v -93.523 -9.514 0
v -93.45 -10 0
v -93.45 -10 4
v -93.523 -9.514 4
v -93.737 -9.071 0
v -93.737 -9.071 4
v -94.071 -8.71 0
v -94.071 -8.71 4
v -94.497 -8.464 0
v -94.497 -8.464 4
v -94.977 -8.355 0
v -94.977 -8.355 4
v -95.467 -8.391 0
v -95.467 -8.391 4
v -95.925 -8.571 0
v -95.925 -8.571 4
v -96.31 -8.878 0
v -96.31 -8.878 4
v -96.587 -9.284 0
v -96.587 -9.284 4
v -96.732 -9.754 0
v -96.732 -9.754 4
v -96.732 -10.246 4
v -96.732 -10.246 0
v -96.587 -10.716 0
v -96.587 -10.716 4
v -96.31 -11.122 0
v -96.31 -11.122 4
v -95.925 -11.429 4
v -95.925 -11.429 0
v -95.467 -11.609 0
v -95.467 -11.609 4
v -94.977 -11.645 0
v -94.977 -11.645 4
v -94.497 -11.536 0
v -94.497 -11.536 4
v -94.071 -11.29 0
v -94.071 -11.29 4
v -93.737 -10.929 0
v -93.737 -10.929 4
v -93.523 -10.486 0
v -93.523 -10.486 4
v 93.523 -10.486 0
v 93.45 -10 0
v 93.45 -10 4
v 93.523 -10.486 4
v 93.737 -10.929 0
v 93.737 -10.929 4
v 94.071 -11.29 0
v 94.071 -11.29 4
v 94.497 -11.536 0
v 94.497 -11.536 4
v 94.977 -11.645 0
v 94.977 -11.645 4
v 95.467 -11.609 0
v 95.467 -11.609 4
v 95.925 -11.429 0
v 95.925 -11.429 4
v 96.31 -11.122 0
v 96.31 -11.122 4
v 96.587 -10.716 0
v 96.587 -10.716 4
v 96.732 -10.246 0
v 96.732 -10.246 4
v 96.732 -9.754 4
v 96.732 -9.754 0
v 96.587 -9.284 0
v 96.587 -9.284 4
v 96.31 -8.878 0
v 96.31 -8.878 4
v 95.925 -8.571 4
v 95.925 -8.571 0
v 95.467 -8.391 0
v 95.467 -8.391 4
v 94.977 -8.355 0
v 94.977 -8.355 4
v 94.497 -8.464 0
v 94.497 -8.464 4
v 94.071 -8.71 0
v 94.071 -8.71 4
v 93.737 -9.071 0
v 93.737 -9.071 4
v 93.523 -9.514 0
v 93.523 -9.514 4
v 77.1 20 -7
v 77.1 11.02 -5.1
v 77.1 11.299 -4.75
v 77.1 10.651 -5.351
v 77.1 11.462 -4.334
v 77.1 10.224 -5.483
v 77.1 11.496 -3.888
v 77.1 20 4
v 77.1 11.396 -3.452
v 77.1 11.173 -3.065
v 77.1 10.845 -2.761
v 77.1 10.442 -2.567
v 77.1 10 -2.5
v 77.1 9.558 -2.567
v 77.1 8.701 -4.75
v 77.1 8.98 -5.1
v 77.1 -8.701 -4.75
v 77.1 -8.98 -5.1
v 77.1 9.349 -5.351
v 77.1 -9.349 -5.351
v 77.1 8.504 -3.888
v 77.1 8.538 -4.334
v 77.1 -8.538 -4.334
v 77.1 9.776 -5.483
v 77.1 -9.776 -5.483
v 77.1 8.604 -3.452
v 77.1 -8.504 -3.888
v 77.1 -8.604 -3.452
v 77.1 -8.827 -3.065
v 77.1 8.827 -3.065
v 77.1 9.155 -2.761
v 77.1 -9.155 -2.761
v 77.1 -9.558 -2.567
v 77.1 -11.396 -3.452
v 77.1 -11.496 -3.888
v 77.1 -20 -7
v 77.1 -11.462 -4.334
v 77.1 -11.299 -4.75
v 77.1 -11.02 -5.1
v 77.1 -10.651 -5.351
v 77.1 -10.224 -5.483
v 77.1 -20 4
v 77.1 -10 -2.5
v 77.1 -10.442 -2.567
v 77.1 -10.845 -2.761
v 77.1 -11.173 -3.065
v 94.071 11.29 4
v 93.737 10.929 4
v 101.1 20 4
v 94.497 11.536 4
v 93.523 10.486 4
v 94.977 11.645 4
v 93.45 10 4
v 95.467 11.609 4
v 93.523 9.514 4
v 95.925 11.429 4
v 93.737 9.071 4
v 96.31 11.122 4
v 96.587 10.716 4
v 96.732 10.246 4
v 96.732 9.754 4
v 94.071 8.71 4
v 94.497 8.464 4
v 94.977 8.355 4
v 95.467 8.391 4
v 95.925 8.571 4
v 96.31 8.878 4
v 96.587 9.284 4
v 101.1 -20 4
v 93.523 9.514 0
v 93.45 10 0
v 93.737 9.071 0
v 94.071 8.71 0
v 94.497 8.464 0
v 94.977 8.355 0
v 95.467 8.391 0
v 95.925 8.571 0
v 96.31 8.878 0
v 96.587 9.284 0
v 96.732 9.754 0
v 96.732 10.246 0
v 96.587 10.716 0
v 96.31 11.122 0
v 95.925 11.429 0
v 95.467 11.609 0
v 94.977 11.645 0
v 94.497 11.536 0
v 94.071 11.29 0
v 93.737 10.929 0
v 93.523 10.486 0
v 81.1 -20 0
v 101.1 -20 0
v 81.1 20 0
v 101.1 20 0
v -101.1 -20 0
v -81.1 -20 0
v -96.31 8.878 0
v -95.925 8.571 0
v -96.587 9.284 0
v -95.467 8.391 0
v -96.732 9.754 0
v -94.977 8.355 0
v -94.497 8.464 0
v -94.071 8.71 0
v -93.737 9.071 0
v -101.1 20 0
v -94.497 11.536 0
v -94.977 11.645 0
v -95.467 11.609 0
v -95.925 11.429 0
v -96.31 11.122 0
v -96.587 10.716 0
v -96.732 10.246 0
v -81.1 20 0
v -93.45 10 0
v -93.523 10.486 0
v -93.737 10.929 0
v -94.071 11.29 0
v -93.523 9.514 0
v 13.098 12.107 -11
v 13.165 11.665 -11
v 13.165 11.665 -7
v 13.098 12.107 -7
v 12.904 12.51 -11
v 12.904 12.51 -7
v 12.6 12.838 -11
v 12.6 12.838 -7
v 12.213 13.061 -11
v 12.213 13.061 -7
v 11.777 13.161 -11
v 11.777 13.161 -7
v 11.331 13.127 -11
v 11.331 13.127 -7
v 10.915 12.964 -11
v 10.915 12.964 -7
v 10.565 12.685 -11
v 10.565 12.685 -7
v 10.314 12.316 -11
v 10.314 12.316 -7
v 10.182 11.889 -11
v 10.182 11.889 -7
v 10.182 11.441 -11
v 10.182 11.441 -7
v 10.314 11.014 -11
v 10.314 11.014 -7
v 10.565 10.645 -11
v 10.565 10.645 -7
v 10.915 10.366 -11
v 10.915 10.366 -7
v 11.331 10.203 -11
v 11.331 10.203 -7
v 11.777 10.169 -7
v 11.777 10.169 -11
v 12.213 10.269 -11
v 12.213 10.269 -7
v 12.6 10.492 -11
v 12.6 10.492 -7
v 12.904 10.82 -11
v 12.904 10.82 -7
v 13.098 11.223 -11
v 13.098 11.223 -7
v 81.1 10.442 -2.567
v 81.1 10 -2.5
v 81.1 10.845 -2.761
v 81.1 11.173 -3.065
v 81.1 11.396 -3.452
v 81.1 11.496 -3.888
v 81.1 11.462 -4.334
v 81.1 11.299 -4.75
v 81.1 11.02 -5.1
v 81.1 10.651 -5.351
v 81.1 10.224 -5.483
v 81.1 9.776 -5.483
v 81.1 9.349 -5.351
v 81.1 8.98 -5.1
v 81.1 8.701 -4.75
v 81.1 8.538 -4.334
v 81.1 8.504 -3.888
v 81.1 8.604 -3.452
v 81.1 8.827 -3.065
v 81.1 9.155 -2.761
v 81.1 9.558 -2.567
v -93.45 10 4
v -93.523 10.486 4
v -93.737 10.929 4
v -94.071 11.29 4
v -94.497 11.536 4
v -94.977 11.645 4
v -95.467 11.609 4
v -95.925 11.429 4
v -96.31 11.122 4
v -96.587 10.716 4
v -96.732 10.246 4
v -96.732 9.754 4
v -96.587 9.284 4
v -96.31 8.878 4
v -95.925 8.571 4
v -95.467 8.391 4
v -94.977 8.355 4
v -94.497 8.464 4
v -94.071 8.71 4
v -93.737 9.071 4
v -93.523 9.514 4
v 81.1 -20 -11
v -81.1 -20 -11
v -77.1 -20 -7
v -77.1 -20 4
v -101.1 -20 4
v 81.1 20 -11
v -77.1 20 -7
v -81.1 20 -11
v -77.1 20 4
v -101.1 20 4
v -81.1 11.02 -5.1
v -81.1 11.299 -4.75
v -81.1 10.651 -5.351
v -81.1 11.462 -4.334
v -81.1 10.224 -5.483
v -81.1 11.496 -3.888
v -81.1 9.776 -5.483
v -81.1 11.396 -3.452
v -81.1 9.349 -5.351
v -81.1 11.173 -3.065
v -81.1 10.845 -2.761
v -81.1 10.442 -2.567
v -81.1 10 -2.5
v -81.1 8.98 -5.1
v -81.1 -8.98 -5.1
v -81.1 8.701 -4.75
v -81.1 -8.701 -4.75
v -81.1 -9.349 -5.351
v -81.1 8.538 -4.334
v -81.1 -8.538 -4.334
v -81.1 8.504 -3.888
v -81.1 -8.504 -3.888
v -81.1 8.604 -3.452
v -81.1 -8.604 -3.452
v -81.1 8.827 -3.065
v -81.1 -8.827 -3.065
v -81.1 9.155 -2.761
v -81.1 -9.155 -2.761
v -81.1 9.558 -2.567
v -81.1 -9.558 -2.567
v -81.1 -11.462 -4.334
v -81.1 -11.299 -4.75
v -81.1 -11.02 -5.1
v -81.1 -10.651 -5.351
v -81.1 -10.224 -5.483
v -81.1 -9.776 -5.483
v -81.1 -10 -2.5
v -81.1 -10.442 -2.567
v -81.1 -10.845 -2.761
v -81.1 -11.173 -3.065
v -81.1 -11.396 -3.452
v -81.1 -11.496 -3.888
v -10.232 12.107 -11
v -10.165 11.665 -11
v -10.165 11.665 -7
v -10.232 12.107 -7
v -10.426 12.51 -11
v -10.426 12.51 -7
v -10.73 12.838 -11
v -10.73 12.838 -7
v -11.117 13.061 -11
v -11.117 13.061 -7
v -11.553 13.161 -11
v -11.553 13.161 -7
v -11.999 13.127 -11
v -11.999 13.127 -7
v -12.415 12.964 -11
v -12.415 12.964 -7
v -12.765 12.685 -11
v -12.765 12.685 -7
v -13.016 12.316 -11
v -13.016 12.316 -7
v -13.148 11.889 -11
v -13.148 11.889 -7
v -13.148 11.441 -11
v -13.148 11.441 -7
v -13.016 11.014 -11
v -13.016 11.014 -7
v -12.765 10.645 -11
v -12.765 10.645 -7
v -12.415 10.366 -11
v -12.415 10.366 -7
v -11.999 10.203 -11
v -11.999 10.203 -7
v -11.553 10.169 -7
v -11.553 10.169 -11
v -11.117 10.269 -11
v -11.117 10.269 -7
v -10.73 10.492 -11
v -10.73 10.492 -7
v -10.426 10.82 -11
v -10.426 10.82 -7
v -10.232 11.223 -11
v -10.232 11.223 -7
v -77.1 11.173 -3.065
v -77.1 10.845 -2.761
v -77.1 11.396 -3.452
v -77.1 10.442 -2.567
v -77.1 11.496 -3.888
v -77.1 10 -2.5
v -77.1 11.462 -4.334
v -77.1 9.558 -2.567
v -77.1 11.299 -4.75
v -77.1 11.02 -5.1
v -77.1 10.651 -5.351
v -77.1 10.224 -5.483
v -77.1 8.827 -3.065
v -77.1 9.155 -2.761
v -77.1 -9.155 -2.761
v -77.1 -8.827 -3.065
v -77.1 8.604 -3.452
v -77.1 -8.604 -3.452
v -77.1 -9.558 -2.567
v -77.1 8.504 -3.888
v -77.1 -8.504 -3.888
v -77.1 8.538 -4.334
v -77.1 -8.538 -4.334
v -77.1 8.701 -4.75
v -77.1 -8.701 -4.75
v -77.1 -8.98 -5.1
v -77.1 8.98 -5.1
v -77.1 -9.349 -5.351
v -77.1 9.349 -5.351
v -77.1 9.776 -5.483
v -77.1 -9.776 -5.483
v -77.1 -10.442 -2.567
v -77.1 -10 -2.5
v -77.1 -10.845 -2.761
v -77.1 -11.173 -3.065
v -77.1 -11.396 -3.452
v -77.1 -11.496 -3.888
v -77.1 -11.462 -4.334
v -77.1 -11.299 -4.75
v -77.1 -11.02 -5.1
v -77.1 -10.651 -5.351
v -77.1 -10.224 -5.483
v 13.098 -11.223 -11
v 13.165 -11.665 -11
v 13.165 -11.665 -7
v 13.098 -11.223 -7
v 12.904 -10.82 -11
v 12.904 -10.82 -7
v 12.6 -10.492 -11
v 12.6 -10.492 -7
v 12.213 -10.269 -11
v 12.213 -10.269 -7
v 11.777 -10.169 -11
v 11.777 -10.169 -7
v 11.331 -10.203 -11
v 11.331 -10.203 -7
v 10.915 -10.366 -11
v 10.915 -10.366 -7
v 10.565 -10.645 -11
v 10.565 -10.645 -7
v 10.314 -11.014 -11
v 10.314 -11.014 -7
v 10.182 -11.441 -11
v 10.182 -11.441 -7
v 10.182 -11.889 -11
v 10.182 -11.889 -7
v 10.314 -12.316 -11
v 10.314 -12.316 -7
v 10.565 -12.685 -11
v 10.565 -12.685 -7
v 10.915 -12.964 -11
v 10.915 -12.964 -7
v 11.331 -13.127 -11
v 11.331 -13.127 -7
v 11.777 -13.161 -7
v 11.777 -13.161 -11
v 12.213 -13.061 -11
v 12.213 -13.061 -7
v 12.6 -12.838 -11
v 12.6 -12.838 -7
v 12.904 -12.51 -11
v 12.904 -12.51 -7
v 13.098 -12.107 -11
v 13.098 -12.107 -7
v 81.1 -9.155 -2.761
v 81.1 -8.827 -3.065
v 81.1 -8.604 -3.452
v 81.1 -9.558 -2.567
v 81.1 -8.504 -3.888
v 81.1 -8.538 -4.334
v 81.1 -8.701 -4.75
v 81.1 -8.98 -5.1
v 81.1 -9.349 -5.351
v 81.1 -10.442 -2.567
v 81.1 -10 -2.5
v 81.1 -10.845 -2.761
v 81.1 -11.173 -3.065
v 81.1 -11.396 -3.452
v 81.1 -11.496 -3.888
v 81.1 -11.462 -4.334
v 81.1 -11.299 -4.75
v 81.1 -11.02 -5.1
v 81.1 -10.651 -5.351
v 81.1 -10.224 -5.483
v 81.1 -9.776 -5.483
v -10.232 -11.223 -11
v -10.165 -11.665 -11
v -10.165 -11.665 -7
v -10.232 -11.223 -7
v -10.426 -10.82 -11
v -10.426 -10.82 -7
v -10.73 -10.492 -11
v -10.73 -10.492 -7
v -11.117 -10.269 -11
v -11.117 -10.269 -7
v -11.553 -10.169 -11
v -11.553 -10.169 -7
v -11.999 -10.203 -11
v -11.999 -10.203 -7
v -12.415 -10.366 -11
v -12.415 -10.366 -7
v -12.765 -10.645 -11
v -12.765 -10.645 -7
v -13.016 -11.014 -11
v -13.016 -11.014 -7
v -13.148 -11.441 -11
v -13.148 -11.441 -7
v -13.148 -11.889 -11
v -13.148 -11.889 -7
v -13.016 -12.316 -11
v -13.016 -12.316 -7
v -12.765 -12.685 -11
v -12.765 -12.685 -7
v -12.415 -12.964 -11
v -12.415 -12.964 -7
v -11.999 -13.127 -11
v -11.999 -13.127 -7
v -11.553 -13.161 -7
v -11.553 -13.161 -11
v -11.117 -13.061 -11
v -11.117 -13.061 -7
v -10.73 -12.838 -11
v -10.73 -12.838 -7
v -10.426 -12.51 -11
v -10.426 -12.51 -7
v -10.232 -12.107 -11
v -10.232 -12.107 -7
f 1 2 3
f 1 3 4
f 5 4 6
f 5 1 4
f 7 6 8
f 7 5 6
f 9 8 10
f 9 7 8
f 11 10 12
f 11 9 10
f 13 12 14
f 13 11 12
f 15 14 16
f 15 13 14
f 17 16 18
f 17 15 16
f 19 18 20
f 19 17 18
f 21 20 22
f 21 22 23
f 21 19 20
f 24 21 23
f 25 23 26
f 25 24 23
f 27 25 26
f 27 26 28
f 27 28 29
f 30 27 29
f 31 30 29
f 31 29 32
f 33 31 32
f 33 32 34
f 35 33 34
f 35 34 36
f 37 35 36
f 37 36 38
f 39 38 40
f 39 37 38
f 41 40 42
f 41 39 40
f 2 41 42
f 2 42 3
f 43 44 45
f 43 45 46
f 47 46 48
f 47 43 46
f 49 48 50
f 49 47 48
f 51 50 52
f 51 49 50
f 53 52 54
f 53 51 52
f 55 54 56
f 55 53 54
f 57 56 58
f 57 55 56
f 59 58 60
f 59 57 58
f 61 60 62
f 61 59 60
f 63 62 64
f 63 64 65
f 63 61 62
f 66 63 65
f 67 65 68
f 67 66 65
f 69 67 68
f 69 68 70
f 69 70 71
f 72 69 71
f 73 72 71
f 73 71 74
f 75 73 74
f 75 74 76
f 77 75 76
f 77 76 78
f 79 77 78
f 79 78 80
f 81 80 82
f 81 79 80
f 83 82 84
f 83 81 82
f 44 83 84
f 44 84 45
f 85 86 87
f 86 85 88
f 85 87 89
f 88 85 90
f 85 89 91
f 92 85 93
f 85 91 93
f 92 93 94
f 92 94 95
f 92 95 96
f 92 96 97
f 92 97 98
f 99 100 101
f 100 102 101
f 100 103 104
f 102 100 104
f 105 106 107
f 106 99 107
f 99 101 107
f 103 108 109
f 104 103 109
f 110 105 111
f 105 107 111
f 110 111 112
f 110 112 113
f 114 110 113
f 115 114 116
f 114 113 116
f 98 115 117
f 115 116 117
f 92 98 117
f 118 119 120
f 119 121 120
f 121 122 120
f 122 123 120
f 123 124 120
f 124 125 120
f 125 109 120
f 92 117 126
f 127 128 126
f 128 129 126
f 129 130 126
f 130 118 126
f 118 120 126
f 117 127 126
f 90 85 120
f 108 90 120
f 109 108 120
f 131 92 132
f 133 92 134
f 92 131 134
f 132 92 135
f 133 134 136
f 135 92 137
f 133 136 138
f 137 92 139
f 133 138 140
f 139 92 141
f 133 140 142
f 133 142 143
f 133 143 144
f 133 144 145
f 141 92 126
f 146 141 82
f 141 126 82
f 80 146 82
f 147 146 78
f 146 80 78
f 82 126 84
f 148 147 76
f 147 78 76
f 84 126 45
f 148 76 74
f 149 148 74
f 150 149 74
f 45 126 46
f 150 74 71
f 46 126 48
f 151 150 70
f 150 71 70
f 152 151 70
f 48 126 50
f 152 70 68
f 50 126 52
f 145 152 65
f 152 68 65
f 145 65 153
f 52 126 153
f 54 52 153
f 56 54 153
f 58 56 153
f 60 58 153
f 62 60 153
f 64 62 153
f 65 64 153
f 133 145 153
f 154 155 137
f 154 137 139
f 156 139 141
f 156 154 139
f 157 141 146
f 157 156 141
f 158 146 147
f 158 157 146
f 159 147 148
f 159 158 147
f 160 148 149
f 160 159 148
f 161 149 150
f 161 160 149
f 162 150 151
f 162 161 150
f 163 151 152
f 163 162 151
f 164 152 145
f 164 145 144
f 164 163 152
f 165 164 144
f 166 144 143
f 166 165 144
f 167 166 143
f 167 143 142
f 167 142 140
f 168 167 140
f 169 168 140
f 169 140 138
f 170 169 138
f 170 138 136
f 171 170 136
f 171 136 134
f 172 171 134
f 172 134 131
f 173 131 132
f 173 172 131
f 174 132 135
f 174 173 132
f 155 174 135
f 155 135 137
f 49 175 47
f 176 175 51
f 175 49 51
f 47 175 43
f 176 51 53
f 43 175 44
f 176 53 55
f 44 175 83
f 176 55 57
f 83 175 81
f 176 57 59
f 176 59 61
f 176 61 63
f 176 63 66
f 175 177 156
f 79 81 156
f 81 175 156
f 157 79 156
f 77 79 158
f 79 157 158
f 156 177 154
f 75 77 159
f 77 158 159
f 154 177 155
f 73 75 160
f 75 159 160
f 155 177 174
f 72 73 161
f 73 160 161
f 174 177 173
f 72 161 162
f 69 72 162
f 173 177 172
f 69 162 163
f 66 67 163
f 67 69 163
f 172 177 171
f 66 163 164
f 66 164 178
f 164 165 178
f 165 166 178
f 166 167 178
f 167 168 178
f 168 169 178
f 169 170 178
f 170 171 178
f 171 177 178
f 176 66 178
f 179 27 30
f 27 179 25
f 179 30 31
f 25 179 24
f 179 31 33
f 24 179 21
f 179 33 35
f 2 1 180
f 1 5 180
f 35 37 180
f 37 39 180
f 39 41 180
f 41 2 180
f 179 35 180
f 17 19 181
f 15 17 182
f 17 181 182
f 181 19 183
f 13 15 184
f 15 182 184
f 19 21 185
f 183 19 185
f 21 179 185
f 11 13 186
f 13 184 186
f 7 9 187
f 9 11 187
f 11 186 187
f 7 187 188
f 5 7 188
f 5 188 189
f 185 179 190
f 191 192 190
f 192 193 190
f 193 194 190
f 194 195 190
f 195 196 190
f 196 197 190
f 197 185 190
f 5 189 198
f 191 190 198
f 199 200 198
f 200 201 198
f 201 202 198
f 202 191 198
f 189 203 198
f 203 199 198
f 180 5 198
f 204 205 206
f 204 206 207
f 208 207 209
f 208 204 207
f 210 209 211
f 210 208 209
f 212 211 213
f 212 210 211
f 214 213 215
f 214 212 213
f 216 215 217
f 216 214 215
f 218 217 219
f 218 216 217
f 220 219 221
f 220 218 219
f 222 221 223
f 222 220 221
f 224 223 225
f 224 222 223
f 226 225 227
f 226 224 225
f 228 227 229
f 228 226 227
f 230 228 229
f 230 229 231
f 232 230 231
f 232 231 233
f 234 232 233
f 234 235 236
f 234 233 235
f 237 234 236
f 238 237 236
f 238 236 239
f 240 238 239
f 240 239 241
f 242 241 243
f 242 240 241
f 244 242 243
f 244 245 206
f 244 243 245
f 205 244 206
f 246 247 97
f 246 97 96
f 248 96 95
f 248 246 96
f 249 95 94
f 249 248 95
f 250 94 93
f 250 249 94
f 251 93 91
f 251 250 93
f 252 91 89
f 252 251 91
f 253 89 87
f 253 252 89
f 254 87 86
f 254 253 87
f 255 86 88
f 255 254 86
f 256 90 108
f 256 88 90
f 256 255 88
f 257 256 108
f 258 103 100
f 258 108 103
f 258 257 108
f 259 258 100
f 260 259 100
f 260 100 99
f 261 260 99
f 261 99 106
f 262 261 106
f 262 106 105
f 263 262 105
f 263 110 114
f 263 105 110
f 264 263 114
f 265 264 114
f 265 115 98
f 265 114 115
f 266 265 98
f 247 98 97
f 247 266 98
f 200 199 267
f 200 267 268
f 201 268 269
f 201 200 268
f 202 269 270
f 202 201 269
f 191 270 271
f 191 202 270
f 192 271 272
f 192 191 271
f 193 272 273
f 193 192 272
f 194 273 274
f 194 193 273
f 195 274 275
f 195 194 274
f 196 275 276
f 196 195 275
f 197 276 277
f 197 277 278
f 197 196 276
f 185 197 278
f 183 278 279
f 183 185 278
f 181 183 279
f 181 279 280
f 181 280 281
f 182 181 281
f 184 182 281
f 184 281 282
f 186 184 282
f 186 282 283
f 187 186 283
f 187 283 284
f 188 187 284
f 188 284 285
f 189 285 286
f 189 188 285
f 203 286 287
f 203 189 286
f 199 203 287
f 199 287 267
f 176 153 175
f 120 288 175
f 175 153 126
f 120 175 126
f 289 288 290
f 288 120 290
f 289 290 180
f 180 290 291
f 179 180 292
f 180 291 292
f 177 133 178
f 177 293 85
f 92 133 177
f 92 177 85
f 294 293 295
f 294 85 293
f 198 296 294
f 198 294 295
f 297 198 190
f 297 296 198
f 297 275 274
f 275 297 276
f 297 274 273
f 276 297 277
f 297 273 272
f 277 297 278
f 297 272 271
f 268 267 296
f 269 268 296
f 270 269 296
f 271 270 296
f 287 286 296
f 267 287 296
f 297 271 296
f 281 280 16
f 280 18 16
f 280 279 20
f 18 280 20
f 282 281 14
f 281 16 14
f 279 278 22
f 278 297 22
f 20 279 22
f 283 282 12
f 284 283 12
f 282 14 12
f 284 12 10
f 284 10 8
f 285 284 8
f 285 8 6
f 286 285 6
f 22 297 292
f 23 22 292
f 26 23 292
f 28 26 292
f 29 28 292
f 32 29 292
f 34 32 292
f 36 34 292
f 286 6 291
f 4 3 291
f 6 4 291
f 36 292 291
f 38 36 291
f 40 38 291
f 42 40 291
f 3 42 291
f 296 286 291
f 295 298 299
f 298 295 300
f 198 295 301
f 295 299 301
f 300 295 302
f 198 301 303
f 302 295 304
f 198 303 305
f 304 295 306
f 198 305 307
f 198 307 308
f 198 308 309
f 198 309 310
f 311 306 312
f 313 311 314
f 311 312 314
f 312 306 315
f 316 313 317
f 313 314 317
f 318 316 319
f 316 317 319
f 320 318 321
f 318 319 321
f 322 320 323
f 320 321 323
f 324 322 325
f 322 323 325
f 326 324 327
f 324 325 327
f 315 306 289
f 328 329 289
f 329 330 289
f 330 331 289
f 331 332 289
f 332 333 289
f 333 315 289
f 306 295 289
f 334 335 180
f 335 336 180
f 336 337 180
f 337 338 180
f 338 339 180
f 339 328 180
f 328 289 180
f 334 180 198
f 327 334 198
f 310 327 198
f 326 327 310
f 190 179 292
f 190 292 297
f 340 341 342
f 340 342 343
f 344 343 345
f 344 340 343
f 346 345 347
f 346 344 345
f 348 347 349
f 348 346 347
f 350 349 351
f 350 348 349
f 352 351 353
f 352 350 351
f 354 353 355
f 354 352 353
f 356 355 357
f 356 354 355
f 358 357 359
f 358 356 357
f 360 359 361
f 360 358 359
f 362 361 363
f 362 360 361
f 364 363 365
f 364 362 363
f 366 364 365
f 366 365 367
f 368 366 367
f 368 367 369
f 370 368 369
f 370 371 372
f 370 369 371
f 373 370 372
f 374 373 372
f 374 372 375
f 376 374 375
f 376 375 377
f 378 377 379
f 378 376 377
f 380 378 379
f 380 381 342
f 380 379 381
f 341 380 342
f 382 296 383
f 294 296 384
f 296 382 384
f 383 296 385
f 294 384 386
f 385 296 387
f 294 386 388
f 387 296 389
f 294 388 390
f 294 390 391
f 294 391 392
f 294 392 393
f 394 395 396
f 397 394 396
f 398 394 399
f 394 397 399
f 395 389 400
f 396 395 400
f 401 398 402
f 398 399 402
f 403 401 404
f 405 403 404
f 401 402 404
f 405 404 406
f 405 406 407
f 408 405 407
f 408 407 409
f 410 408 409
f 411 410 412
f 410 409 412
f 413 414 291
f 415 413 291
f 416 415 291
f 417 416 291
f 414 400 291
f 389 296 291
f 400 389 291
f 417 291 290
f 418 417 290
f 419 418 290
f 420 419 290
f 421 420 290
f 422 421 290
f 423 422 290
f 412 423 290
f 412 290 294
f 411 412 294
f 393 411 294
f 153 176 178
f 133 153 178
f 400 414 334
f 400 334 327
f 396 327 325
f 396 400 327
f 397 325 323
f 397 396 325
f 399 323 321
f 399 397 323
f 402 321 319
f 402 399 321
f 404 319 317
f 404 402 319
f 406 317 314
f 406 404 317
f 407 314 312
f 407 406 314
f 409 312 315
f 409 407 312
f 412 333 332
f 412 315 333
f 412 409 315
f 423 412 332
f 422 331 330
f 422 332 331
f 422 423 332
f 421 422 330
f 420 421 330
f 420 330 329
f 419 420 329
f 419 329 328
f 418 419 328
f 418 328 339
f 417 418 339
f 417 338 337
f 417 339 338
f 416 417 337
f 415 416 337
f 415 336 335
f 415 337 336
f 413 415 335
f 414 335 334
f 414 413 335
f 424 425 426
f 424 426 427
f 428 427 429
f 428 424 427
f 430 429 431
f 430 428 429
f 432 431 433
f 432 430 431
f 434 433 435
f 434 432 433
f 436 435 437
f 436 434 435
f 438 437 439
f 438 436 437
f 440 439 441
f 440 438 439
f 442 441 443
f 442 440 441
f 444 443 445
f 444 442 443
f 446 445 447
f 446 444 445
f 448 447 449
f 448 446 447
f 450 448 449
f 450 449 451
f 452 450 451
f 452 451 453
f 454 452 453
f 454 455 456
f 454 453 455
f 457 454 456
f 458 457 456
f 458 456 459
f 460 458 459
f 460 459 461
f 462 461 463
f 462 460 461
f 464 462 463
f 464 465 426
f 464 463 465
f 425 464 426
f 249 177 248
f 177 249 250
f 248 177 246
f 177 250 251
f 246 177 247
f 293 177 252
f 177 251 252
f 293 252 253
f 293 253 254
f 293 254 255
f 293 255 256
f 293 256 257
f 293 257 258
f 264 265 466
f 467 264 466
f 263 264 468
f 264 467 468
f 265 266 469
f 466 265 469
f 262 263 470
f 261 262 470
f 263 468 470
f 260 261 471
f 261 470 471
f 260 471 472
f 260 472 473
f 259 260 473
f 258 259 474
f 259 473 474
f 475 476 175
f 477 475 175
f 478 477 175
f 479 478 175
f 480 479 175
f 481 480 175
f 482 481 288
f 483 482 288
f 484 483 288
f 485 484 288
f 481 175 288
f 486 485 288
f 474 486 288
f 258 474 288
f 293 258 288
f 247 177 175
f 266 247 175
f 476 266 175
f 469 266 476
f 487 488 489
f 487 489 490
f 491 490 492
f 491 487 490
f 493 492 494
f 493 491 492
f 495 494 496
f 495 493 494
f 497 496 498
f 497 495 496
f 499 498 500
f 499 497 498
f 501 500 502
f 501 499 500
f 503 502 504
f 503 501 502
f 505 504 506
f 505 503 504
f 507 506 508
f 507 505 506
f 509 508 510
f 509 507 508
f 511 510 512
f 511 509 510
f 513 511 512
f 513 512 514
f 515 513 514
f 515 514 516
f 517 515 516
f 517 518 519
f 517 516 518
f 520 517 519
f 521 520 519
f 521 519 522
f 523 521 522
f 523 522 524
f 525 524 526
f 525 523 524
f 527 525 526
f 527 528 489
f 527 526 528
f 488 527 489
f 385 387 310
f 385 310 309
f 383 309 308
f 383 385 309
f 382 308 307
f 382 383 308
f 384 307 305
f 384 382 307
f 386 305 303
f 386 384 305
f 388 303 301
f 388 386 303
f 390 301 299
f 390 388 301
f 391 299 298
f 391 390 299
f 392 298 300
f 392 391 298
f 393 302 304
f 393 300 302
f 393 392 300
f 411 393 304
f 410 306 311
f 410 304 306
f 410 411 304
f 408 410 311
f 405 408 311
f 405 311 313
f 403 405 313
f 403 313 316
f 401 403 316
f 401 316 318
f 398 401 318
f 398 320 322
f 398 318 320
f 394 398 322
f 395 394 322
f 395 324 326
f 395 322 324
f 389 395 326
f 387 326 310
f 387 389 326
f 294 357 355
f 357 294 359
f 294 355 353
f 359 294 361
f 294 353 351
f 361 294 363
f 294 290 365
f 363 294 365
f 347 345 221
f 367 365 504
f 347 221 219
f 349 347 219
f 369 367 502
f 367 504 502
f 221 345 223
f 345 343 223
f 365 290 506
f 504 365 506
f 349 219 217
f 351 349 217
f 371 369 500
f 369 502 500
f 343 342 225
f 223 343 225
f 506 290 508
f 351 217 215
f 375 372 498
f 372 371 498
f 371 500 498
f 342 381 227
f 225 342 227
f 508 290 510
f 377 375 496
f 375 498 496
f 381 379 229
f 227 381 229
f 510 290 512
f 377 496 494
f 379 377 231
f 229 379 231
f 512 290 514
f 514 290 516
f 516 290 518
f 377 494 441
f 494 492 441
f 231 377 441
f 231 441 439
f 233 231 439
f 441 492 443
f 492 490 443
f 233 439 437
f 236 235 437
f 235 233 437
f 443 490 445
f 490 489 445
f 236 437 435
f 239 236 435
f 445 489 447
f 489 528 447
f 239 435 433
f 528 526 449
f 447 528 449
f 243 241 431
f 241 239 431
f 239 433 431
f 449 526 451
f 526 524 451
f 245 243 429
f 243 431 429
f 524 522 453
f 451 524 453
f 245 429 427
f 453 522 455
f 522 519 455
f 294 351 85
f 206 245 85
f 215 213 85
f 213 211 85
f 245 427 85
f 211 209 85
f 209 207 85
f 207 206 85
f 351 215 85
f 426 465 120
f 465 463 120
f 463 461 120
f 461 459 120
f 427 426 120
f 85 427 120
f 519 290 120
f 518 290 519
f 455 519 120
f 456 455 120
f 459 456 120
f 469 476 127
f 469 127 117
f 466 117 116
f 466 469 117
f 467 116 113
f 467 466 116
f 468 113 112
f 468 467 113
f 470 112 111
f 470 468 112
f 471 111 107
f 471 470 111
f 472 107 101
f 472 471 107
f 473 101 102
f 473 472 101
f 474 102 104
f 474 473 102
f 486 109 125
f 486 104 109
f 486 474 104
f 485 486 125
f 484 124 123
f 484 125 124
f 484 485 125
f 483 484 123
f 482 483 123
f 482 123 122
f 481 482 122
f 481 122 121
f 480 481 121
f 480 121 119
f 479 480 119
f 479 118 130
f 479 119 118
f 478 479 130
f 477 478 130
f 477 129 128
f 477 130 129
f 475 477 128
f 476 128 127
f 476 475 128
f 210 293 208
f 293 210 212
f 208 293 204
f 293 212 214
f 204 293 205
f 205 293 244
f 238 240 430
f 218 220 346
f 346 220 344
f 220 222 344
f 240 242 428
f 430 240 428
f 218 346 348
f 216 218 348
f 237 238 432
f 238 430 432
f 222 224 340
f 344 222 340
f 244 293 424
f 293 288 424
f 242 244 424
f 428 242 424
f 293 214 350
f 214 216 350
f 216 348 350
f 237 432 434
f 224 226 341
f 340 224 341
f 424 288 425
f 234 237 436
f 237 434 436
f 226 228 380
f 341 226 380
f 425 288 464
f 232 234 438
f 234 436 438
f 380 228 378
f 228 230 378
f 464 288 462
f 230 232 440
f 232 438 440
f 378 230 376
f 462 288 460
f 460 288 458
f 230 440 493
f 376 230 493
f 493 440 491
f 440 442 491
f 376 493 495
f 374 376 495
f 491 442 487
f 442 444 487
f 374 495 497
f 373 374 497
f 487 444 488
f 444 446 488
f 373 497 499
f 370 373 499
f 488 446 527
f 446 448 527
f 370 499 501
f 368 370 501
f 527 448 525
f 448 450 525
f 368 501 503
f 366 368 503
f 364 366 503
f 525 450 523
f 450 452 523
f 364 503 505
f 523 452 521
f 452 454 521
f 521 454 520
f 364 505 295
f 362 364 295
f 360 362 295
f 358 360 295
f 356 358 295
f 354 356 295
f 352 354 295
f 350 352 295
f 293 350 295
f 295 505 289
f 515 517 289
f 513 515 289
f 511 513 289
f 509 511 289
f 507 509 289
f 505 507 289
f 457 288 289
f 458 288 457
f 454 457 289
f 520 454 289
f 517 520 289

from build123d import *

# Parameters (mm, degrees)
SKETCH1_W               = 202.2
SKETCH1_H               = 40
SKETCH1_R               = 1.65
BOSS_EXTRUDE1_DEPTH     = 4
SKETCH2_W               = 162.2
SKETCH2_H               = 40
CUT_EXTRUDE1_DEPTH      = 4
BOSS_EXTRUDE3_DEPTH     = 40
CUT_EXTRUDE2_DEPTH      = 184.624181414
CUT_EXTRUDE2_DEPTH_BACK = 184.624181414
SKETCH4_R               = 1.5
CUT_EXTRUDE3_DEPTH      = 104.644633243
CUT_EXTRUDE3_DEPTH_BACK = 104.644633243
SKETCH5_R               = 1.5


with BuildPart() as part:
    # Sketch1 → Boss-Extrude1 (new body)
    with BuildSketch(Plane.XY):
        Rectangle(SKETCH1_W, SKETCH1_H)
        with Locations((-95.1, 10)):
            Circle(SKETCH1_R, mode=Mode.SUBTRACT)
        with Locations((-95.1, -10)):
            Circle(SKETCH1_R, mode=Mode.SUBTRACT)
        with Locations(Location((95.1, -10, 0), (0, 0, 180))):
            Circle(SKETCH1_R, mode=Mode.SUBTRACT)
        with Locations(Location((95.1, 10, 0), (0, 0, 180))):
            Circle(SKETCH1_R, mode=Mode.SUBTRACT)
    extrude(amount=BOSS_EXTRUDE1_DEPTH)

    # Sketch2 → Cut-Extrude1 (cut)
    with BuildSketch(Plane.XY.offset(4)):
        Rectangle(SKETCH2_W, SKETCH2_H)
    extrude(amount=-CUT_EXTRUDE1_DEPTH, mode=Mode.SUBTRACT)


with BuildPart() as cut_extrude1_piece_1:
    # of the separate pieces the step leaves, piece 1, a body of its own (cut_extrude1_pieces)
    add(part.part.solids().sort_by_distance((-101.1, 20, 0))[0])



with BuildPart() as cut_extrude1_piece_2:
    # of the separate pieces the step leaves, piece 2, a body of its own (cut_extrude1_pieces)
    add(part.part.solids().sort_by_distance((81.1, 20, 0))[0])


with BuildPart() as cut_extrude1_piece_1_1:
    add(cut_extrude1_piece_1.part)

    add(cut_extrude1_piece_2.part)  # Boss-Extrude3 merges Cut-Extrude1 piece 2
    # Sketch3 → Boss-Extrude3 (add)
    with BuildSketch(Plane.XZ.offset(20)):
        Polygon((-81.1, 4), (-77.1, 4), (-77.1, -7), (77.1, -7), (77.1, 4), (81.1, 4), (81.1, -11), (-81.1, -11), align=None)
    extrude(amount=-BOSS_EXTRUDE3_DEPTH)

    # Sketch4 → Cut-Extrude2 (cut, two sides: drawn at the far end of the back side and taken through both)
    with BuildSketch(Plane.ZY.offset(81.1).offset(-CUT_EXTRUDE2_DEPTH_BACK)):
        with Locations((-4, 10)):
            Circle(SKETCH4_R)
        with Locations((-4, -10)):
            Circle(SKETCH4_R)
    extrude(amount=CUT_EXTRUDE2_DEPTH + CUT_EXTRUDE2_DEPTH_BACK, mode=Mode.SUBTRACT)

    # Sketch5 → Cut-Extrude3 (cut, two sides: drawn at the far end of the back side and taken through both)
    with BuildSketch(Plane.XY.offset(-7).offset(-CUT_EXTRUDE3_DEPTH_BACK)):
        with Locations((-11.665, 11.665)):
            Circle(SKETCH5_R)
        with Locations((11.665, 11.665)):
            Circle(SKETCH5_R)
        with Locations((11.665, -11.665)):
            Circle(SKETCH5_R)
        with Locations((-11.665, -11.665)):
            Circle(SKETCH5_R)
    extrude(amount=CUT_EXTRUDE3_DEPTH + CUT_EXTRUDE3_DEPTH_BACK, mode=Mode.SUBTRACT)


solid = cut_extrude1_piece_1_1.part
